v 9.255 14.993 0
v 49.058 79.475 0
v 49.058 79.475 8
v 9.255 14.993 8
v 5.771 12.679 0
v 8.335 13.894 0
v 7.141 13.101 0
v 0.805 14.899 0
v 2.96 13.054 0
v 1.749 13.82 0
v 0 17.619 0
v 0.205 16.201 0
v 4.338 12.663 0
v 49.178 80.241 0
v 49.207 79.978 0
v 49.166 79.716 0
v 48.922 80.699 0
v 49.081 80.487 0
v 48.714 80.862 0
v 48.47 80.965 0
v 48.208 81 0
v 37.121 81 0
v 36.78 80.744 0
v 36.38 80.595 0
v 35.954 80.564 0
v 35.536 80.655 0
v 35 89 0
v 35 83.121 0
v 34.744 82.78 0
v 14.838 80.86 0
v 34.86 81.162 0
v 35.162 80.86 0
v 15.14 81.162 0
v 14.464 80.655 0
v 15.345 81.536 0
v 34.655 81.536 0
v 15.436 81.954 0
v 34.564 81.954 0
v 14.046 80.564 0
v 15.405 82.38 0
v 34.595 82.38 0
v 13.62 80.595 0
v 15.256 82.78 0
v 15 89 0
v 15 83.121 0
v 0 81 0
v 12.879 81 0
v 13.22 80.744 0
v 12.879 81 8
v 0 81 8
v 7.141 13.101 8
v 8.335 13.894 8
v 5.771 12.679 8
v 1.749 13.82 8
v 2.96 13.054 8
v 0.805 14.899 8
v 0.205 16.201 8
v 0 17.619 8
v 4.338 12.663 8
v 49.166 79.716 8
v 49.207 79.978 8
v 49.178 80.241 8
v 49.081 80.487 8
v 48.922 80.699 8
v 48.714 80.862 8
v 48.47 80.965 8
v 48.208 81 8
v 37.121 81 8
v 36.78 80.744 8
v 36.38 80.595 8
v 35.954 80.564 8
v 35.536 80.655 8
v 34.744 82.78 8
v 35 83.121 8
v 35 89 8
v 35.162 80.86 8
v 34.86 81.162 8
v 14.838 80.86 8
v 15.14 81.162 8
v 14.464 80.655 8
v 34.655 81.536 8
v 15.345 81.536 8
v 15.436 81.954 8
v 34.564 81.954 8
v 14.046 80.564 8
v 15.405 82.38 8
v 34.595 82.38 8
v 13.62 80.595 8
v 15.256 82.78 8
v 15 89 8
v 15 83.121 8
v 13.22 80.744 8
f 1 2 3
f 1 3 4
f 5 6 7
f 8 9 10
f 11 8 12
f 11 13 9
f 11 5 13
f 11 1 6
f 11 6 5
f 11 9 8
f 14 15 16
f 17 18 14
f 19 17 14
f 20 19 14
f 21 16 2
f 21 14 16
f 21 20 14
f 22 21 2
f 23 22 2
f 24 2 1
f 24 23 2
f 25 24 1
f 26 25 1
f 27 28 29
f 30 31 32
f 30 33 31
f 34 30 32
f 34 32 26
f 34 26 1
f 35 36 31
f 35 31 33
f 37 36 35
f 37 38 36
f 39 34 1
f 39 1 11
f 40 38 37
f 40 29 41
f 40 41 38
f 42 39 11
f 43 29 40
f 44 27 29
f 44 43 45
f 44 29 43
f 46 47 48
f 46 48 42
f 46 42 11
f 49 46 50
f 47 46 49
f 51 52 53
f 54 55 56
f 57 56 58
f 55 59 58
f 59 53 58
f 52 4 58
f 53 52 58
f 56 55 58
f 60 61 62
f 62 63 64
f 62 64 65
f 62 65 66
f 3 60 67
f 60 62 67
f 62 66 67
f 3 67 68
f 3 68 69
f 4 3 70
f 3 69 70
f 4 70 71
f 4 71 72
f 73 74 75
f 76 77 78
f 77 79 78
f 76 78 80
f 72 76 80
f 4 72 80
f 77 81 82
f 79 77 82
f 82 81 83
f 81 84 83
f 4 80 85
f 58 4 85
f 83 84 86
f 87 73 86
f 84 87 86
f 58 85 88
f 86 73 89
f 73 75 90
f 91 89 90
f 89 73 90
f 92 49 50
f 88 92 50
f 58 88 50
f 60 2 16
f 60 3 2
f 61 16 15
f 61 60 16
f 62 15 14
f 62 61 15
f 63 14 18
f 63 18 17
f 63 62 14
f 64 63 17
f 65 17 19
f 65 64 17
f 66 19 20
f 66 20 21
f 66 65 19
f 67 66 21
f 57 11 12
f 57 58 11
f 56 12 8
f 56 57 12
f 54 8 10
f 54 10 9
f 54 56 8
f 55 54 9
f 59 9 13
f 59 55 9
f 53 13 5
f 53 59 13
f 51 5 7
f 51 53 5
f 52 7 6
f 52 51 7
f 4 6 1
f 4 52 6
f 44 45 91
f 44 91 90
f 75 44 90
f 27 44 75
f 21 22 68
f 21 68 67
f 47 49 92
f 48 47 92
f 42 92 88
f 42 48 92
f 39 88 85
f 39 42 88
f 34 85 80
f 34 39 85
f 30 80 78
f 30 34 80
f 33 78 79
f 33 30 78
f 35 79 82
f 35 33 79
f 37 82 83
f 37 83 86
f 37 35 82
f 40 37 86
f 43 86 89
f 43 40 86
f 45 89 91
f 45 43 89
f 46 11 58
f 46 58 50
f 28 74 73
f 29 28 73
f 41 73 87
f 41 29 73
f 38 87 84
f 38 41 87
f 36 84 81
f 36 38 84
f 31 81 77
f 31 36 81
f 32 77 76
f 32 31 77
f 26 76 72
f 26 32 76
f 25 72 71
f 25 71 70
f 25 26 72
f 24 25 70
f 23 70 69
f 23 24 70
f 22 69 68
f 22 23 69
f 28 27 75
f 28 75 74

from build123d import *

# Parameters (mm, degrees)
BOSS_EXTRU_1_DEPTH = 8
CONG_1_R           = 5
CONG_2_R           = 1


with BuildPart() as part:
    # Esquisse1 → Boss.-Extru.1 (new body)
    with BuildSketch(Plane.XY):
        with BuildLine():
            Line((0, 0), (0, 81))
            Line((0, 81), (12.878679656, 81))
            ThreePointArc((12.878679656, 81), (15, 81), (15, 83.121320344))
            Line((15, 83.121320344), (15, 89))
            Line((15, 89), (35, 89))
            Line((35, 89), (35, 83.121320344))
            ThreePointArc((35, 83.121320344), (35, 81), (37.121320344, 81))
            Line((37.121320344, 81), (50, 81))
            Line((50, 81), (0, 0))
        make_face()
    extrude(amount=BOSS_EXTRU_1_DEPTH)

    # Congé1
    cong_1_edges = [part.edges().sort_by_distance(p)[0] for p in [
        (0, 0, 4),
    ]]
    fillet(cong_1_edges, radius=CONG_1_R)

    # Congé2
    cong_2_edges = [part.edges().sort_by_distance(p)[0] for p in [
        (50, 81, 4),
    ]]
    fillet(cong_2_edges, radius=CONG_2_R)


solid = part.part
